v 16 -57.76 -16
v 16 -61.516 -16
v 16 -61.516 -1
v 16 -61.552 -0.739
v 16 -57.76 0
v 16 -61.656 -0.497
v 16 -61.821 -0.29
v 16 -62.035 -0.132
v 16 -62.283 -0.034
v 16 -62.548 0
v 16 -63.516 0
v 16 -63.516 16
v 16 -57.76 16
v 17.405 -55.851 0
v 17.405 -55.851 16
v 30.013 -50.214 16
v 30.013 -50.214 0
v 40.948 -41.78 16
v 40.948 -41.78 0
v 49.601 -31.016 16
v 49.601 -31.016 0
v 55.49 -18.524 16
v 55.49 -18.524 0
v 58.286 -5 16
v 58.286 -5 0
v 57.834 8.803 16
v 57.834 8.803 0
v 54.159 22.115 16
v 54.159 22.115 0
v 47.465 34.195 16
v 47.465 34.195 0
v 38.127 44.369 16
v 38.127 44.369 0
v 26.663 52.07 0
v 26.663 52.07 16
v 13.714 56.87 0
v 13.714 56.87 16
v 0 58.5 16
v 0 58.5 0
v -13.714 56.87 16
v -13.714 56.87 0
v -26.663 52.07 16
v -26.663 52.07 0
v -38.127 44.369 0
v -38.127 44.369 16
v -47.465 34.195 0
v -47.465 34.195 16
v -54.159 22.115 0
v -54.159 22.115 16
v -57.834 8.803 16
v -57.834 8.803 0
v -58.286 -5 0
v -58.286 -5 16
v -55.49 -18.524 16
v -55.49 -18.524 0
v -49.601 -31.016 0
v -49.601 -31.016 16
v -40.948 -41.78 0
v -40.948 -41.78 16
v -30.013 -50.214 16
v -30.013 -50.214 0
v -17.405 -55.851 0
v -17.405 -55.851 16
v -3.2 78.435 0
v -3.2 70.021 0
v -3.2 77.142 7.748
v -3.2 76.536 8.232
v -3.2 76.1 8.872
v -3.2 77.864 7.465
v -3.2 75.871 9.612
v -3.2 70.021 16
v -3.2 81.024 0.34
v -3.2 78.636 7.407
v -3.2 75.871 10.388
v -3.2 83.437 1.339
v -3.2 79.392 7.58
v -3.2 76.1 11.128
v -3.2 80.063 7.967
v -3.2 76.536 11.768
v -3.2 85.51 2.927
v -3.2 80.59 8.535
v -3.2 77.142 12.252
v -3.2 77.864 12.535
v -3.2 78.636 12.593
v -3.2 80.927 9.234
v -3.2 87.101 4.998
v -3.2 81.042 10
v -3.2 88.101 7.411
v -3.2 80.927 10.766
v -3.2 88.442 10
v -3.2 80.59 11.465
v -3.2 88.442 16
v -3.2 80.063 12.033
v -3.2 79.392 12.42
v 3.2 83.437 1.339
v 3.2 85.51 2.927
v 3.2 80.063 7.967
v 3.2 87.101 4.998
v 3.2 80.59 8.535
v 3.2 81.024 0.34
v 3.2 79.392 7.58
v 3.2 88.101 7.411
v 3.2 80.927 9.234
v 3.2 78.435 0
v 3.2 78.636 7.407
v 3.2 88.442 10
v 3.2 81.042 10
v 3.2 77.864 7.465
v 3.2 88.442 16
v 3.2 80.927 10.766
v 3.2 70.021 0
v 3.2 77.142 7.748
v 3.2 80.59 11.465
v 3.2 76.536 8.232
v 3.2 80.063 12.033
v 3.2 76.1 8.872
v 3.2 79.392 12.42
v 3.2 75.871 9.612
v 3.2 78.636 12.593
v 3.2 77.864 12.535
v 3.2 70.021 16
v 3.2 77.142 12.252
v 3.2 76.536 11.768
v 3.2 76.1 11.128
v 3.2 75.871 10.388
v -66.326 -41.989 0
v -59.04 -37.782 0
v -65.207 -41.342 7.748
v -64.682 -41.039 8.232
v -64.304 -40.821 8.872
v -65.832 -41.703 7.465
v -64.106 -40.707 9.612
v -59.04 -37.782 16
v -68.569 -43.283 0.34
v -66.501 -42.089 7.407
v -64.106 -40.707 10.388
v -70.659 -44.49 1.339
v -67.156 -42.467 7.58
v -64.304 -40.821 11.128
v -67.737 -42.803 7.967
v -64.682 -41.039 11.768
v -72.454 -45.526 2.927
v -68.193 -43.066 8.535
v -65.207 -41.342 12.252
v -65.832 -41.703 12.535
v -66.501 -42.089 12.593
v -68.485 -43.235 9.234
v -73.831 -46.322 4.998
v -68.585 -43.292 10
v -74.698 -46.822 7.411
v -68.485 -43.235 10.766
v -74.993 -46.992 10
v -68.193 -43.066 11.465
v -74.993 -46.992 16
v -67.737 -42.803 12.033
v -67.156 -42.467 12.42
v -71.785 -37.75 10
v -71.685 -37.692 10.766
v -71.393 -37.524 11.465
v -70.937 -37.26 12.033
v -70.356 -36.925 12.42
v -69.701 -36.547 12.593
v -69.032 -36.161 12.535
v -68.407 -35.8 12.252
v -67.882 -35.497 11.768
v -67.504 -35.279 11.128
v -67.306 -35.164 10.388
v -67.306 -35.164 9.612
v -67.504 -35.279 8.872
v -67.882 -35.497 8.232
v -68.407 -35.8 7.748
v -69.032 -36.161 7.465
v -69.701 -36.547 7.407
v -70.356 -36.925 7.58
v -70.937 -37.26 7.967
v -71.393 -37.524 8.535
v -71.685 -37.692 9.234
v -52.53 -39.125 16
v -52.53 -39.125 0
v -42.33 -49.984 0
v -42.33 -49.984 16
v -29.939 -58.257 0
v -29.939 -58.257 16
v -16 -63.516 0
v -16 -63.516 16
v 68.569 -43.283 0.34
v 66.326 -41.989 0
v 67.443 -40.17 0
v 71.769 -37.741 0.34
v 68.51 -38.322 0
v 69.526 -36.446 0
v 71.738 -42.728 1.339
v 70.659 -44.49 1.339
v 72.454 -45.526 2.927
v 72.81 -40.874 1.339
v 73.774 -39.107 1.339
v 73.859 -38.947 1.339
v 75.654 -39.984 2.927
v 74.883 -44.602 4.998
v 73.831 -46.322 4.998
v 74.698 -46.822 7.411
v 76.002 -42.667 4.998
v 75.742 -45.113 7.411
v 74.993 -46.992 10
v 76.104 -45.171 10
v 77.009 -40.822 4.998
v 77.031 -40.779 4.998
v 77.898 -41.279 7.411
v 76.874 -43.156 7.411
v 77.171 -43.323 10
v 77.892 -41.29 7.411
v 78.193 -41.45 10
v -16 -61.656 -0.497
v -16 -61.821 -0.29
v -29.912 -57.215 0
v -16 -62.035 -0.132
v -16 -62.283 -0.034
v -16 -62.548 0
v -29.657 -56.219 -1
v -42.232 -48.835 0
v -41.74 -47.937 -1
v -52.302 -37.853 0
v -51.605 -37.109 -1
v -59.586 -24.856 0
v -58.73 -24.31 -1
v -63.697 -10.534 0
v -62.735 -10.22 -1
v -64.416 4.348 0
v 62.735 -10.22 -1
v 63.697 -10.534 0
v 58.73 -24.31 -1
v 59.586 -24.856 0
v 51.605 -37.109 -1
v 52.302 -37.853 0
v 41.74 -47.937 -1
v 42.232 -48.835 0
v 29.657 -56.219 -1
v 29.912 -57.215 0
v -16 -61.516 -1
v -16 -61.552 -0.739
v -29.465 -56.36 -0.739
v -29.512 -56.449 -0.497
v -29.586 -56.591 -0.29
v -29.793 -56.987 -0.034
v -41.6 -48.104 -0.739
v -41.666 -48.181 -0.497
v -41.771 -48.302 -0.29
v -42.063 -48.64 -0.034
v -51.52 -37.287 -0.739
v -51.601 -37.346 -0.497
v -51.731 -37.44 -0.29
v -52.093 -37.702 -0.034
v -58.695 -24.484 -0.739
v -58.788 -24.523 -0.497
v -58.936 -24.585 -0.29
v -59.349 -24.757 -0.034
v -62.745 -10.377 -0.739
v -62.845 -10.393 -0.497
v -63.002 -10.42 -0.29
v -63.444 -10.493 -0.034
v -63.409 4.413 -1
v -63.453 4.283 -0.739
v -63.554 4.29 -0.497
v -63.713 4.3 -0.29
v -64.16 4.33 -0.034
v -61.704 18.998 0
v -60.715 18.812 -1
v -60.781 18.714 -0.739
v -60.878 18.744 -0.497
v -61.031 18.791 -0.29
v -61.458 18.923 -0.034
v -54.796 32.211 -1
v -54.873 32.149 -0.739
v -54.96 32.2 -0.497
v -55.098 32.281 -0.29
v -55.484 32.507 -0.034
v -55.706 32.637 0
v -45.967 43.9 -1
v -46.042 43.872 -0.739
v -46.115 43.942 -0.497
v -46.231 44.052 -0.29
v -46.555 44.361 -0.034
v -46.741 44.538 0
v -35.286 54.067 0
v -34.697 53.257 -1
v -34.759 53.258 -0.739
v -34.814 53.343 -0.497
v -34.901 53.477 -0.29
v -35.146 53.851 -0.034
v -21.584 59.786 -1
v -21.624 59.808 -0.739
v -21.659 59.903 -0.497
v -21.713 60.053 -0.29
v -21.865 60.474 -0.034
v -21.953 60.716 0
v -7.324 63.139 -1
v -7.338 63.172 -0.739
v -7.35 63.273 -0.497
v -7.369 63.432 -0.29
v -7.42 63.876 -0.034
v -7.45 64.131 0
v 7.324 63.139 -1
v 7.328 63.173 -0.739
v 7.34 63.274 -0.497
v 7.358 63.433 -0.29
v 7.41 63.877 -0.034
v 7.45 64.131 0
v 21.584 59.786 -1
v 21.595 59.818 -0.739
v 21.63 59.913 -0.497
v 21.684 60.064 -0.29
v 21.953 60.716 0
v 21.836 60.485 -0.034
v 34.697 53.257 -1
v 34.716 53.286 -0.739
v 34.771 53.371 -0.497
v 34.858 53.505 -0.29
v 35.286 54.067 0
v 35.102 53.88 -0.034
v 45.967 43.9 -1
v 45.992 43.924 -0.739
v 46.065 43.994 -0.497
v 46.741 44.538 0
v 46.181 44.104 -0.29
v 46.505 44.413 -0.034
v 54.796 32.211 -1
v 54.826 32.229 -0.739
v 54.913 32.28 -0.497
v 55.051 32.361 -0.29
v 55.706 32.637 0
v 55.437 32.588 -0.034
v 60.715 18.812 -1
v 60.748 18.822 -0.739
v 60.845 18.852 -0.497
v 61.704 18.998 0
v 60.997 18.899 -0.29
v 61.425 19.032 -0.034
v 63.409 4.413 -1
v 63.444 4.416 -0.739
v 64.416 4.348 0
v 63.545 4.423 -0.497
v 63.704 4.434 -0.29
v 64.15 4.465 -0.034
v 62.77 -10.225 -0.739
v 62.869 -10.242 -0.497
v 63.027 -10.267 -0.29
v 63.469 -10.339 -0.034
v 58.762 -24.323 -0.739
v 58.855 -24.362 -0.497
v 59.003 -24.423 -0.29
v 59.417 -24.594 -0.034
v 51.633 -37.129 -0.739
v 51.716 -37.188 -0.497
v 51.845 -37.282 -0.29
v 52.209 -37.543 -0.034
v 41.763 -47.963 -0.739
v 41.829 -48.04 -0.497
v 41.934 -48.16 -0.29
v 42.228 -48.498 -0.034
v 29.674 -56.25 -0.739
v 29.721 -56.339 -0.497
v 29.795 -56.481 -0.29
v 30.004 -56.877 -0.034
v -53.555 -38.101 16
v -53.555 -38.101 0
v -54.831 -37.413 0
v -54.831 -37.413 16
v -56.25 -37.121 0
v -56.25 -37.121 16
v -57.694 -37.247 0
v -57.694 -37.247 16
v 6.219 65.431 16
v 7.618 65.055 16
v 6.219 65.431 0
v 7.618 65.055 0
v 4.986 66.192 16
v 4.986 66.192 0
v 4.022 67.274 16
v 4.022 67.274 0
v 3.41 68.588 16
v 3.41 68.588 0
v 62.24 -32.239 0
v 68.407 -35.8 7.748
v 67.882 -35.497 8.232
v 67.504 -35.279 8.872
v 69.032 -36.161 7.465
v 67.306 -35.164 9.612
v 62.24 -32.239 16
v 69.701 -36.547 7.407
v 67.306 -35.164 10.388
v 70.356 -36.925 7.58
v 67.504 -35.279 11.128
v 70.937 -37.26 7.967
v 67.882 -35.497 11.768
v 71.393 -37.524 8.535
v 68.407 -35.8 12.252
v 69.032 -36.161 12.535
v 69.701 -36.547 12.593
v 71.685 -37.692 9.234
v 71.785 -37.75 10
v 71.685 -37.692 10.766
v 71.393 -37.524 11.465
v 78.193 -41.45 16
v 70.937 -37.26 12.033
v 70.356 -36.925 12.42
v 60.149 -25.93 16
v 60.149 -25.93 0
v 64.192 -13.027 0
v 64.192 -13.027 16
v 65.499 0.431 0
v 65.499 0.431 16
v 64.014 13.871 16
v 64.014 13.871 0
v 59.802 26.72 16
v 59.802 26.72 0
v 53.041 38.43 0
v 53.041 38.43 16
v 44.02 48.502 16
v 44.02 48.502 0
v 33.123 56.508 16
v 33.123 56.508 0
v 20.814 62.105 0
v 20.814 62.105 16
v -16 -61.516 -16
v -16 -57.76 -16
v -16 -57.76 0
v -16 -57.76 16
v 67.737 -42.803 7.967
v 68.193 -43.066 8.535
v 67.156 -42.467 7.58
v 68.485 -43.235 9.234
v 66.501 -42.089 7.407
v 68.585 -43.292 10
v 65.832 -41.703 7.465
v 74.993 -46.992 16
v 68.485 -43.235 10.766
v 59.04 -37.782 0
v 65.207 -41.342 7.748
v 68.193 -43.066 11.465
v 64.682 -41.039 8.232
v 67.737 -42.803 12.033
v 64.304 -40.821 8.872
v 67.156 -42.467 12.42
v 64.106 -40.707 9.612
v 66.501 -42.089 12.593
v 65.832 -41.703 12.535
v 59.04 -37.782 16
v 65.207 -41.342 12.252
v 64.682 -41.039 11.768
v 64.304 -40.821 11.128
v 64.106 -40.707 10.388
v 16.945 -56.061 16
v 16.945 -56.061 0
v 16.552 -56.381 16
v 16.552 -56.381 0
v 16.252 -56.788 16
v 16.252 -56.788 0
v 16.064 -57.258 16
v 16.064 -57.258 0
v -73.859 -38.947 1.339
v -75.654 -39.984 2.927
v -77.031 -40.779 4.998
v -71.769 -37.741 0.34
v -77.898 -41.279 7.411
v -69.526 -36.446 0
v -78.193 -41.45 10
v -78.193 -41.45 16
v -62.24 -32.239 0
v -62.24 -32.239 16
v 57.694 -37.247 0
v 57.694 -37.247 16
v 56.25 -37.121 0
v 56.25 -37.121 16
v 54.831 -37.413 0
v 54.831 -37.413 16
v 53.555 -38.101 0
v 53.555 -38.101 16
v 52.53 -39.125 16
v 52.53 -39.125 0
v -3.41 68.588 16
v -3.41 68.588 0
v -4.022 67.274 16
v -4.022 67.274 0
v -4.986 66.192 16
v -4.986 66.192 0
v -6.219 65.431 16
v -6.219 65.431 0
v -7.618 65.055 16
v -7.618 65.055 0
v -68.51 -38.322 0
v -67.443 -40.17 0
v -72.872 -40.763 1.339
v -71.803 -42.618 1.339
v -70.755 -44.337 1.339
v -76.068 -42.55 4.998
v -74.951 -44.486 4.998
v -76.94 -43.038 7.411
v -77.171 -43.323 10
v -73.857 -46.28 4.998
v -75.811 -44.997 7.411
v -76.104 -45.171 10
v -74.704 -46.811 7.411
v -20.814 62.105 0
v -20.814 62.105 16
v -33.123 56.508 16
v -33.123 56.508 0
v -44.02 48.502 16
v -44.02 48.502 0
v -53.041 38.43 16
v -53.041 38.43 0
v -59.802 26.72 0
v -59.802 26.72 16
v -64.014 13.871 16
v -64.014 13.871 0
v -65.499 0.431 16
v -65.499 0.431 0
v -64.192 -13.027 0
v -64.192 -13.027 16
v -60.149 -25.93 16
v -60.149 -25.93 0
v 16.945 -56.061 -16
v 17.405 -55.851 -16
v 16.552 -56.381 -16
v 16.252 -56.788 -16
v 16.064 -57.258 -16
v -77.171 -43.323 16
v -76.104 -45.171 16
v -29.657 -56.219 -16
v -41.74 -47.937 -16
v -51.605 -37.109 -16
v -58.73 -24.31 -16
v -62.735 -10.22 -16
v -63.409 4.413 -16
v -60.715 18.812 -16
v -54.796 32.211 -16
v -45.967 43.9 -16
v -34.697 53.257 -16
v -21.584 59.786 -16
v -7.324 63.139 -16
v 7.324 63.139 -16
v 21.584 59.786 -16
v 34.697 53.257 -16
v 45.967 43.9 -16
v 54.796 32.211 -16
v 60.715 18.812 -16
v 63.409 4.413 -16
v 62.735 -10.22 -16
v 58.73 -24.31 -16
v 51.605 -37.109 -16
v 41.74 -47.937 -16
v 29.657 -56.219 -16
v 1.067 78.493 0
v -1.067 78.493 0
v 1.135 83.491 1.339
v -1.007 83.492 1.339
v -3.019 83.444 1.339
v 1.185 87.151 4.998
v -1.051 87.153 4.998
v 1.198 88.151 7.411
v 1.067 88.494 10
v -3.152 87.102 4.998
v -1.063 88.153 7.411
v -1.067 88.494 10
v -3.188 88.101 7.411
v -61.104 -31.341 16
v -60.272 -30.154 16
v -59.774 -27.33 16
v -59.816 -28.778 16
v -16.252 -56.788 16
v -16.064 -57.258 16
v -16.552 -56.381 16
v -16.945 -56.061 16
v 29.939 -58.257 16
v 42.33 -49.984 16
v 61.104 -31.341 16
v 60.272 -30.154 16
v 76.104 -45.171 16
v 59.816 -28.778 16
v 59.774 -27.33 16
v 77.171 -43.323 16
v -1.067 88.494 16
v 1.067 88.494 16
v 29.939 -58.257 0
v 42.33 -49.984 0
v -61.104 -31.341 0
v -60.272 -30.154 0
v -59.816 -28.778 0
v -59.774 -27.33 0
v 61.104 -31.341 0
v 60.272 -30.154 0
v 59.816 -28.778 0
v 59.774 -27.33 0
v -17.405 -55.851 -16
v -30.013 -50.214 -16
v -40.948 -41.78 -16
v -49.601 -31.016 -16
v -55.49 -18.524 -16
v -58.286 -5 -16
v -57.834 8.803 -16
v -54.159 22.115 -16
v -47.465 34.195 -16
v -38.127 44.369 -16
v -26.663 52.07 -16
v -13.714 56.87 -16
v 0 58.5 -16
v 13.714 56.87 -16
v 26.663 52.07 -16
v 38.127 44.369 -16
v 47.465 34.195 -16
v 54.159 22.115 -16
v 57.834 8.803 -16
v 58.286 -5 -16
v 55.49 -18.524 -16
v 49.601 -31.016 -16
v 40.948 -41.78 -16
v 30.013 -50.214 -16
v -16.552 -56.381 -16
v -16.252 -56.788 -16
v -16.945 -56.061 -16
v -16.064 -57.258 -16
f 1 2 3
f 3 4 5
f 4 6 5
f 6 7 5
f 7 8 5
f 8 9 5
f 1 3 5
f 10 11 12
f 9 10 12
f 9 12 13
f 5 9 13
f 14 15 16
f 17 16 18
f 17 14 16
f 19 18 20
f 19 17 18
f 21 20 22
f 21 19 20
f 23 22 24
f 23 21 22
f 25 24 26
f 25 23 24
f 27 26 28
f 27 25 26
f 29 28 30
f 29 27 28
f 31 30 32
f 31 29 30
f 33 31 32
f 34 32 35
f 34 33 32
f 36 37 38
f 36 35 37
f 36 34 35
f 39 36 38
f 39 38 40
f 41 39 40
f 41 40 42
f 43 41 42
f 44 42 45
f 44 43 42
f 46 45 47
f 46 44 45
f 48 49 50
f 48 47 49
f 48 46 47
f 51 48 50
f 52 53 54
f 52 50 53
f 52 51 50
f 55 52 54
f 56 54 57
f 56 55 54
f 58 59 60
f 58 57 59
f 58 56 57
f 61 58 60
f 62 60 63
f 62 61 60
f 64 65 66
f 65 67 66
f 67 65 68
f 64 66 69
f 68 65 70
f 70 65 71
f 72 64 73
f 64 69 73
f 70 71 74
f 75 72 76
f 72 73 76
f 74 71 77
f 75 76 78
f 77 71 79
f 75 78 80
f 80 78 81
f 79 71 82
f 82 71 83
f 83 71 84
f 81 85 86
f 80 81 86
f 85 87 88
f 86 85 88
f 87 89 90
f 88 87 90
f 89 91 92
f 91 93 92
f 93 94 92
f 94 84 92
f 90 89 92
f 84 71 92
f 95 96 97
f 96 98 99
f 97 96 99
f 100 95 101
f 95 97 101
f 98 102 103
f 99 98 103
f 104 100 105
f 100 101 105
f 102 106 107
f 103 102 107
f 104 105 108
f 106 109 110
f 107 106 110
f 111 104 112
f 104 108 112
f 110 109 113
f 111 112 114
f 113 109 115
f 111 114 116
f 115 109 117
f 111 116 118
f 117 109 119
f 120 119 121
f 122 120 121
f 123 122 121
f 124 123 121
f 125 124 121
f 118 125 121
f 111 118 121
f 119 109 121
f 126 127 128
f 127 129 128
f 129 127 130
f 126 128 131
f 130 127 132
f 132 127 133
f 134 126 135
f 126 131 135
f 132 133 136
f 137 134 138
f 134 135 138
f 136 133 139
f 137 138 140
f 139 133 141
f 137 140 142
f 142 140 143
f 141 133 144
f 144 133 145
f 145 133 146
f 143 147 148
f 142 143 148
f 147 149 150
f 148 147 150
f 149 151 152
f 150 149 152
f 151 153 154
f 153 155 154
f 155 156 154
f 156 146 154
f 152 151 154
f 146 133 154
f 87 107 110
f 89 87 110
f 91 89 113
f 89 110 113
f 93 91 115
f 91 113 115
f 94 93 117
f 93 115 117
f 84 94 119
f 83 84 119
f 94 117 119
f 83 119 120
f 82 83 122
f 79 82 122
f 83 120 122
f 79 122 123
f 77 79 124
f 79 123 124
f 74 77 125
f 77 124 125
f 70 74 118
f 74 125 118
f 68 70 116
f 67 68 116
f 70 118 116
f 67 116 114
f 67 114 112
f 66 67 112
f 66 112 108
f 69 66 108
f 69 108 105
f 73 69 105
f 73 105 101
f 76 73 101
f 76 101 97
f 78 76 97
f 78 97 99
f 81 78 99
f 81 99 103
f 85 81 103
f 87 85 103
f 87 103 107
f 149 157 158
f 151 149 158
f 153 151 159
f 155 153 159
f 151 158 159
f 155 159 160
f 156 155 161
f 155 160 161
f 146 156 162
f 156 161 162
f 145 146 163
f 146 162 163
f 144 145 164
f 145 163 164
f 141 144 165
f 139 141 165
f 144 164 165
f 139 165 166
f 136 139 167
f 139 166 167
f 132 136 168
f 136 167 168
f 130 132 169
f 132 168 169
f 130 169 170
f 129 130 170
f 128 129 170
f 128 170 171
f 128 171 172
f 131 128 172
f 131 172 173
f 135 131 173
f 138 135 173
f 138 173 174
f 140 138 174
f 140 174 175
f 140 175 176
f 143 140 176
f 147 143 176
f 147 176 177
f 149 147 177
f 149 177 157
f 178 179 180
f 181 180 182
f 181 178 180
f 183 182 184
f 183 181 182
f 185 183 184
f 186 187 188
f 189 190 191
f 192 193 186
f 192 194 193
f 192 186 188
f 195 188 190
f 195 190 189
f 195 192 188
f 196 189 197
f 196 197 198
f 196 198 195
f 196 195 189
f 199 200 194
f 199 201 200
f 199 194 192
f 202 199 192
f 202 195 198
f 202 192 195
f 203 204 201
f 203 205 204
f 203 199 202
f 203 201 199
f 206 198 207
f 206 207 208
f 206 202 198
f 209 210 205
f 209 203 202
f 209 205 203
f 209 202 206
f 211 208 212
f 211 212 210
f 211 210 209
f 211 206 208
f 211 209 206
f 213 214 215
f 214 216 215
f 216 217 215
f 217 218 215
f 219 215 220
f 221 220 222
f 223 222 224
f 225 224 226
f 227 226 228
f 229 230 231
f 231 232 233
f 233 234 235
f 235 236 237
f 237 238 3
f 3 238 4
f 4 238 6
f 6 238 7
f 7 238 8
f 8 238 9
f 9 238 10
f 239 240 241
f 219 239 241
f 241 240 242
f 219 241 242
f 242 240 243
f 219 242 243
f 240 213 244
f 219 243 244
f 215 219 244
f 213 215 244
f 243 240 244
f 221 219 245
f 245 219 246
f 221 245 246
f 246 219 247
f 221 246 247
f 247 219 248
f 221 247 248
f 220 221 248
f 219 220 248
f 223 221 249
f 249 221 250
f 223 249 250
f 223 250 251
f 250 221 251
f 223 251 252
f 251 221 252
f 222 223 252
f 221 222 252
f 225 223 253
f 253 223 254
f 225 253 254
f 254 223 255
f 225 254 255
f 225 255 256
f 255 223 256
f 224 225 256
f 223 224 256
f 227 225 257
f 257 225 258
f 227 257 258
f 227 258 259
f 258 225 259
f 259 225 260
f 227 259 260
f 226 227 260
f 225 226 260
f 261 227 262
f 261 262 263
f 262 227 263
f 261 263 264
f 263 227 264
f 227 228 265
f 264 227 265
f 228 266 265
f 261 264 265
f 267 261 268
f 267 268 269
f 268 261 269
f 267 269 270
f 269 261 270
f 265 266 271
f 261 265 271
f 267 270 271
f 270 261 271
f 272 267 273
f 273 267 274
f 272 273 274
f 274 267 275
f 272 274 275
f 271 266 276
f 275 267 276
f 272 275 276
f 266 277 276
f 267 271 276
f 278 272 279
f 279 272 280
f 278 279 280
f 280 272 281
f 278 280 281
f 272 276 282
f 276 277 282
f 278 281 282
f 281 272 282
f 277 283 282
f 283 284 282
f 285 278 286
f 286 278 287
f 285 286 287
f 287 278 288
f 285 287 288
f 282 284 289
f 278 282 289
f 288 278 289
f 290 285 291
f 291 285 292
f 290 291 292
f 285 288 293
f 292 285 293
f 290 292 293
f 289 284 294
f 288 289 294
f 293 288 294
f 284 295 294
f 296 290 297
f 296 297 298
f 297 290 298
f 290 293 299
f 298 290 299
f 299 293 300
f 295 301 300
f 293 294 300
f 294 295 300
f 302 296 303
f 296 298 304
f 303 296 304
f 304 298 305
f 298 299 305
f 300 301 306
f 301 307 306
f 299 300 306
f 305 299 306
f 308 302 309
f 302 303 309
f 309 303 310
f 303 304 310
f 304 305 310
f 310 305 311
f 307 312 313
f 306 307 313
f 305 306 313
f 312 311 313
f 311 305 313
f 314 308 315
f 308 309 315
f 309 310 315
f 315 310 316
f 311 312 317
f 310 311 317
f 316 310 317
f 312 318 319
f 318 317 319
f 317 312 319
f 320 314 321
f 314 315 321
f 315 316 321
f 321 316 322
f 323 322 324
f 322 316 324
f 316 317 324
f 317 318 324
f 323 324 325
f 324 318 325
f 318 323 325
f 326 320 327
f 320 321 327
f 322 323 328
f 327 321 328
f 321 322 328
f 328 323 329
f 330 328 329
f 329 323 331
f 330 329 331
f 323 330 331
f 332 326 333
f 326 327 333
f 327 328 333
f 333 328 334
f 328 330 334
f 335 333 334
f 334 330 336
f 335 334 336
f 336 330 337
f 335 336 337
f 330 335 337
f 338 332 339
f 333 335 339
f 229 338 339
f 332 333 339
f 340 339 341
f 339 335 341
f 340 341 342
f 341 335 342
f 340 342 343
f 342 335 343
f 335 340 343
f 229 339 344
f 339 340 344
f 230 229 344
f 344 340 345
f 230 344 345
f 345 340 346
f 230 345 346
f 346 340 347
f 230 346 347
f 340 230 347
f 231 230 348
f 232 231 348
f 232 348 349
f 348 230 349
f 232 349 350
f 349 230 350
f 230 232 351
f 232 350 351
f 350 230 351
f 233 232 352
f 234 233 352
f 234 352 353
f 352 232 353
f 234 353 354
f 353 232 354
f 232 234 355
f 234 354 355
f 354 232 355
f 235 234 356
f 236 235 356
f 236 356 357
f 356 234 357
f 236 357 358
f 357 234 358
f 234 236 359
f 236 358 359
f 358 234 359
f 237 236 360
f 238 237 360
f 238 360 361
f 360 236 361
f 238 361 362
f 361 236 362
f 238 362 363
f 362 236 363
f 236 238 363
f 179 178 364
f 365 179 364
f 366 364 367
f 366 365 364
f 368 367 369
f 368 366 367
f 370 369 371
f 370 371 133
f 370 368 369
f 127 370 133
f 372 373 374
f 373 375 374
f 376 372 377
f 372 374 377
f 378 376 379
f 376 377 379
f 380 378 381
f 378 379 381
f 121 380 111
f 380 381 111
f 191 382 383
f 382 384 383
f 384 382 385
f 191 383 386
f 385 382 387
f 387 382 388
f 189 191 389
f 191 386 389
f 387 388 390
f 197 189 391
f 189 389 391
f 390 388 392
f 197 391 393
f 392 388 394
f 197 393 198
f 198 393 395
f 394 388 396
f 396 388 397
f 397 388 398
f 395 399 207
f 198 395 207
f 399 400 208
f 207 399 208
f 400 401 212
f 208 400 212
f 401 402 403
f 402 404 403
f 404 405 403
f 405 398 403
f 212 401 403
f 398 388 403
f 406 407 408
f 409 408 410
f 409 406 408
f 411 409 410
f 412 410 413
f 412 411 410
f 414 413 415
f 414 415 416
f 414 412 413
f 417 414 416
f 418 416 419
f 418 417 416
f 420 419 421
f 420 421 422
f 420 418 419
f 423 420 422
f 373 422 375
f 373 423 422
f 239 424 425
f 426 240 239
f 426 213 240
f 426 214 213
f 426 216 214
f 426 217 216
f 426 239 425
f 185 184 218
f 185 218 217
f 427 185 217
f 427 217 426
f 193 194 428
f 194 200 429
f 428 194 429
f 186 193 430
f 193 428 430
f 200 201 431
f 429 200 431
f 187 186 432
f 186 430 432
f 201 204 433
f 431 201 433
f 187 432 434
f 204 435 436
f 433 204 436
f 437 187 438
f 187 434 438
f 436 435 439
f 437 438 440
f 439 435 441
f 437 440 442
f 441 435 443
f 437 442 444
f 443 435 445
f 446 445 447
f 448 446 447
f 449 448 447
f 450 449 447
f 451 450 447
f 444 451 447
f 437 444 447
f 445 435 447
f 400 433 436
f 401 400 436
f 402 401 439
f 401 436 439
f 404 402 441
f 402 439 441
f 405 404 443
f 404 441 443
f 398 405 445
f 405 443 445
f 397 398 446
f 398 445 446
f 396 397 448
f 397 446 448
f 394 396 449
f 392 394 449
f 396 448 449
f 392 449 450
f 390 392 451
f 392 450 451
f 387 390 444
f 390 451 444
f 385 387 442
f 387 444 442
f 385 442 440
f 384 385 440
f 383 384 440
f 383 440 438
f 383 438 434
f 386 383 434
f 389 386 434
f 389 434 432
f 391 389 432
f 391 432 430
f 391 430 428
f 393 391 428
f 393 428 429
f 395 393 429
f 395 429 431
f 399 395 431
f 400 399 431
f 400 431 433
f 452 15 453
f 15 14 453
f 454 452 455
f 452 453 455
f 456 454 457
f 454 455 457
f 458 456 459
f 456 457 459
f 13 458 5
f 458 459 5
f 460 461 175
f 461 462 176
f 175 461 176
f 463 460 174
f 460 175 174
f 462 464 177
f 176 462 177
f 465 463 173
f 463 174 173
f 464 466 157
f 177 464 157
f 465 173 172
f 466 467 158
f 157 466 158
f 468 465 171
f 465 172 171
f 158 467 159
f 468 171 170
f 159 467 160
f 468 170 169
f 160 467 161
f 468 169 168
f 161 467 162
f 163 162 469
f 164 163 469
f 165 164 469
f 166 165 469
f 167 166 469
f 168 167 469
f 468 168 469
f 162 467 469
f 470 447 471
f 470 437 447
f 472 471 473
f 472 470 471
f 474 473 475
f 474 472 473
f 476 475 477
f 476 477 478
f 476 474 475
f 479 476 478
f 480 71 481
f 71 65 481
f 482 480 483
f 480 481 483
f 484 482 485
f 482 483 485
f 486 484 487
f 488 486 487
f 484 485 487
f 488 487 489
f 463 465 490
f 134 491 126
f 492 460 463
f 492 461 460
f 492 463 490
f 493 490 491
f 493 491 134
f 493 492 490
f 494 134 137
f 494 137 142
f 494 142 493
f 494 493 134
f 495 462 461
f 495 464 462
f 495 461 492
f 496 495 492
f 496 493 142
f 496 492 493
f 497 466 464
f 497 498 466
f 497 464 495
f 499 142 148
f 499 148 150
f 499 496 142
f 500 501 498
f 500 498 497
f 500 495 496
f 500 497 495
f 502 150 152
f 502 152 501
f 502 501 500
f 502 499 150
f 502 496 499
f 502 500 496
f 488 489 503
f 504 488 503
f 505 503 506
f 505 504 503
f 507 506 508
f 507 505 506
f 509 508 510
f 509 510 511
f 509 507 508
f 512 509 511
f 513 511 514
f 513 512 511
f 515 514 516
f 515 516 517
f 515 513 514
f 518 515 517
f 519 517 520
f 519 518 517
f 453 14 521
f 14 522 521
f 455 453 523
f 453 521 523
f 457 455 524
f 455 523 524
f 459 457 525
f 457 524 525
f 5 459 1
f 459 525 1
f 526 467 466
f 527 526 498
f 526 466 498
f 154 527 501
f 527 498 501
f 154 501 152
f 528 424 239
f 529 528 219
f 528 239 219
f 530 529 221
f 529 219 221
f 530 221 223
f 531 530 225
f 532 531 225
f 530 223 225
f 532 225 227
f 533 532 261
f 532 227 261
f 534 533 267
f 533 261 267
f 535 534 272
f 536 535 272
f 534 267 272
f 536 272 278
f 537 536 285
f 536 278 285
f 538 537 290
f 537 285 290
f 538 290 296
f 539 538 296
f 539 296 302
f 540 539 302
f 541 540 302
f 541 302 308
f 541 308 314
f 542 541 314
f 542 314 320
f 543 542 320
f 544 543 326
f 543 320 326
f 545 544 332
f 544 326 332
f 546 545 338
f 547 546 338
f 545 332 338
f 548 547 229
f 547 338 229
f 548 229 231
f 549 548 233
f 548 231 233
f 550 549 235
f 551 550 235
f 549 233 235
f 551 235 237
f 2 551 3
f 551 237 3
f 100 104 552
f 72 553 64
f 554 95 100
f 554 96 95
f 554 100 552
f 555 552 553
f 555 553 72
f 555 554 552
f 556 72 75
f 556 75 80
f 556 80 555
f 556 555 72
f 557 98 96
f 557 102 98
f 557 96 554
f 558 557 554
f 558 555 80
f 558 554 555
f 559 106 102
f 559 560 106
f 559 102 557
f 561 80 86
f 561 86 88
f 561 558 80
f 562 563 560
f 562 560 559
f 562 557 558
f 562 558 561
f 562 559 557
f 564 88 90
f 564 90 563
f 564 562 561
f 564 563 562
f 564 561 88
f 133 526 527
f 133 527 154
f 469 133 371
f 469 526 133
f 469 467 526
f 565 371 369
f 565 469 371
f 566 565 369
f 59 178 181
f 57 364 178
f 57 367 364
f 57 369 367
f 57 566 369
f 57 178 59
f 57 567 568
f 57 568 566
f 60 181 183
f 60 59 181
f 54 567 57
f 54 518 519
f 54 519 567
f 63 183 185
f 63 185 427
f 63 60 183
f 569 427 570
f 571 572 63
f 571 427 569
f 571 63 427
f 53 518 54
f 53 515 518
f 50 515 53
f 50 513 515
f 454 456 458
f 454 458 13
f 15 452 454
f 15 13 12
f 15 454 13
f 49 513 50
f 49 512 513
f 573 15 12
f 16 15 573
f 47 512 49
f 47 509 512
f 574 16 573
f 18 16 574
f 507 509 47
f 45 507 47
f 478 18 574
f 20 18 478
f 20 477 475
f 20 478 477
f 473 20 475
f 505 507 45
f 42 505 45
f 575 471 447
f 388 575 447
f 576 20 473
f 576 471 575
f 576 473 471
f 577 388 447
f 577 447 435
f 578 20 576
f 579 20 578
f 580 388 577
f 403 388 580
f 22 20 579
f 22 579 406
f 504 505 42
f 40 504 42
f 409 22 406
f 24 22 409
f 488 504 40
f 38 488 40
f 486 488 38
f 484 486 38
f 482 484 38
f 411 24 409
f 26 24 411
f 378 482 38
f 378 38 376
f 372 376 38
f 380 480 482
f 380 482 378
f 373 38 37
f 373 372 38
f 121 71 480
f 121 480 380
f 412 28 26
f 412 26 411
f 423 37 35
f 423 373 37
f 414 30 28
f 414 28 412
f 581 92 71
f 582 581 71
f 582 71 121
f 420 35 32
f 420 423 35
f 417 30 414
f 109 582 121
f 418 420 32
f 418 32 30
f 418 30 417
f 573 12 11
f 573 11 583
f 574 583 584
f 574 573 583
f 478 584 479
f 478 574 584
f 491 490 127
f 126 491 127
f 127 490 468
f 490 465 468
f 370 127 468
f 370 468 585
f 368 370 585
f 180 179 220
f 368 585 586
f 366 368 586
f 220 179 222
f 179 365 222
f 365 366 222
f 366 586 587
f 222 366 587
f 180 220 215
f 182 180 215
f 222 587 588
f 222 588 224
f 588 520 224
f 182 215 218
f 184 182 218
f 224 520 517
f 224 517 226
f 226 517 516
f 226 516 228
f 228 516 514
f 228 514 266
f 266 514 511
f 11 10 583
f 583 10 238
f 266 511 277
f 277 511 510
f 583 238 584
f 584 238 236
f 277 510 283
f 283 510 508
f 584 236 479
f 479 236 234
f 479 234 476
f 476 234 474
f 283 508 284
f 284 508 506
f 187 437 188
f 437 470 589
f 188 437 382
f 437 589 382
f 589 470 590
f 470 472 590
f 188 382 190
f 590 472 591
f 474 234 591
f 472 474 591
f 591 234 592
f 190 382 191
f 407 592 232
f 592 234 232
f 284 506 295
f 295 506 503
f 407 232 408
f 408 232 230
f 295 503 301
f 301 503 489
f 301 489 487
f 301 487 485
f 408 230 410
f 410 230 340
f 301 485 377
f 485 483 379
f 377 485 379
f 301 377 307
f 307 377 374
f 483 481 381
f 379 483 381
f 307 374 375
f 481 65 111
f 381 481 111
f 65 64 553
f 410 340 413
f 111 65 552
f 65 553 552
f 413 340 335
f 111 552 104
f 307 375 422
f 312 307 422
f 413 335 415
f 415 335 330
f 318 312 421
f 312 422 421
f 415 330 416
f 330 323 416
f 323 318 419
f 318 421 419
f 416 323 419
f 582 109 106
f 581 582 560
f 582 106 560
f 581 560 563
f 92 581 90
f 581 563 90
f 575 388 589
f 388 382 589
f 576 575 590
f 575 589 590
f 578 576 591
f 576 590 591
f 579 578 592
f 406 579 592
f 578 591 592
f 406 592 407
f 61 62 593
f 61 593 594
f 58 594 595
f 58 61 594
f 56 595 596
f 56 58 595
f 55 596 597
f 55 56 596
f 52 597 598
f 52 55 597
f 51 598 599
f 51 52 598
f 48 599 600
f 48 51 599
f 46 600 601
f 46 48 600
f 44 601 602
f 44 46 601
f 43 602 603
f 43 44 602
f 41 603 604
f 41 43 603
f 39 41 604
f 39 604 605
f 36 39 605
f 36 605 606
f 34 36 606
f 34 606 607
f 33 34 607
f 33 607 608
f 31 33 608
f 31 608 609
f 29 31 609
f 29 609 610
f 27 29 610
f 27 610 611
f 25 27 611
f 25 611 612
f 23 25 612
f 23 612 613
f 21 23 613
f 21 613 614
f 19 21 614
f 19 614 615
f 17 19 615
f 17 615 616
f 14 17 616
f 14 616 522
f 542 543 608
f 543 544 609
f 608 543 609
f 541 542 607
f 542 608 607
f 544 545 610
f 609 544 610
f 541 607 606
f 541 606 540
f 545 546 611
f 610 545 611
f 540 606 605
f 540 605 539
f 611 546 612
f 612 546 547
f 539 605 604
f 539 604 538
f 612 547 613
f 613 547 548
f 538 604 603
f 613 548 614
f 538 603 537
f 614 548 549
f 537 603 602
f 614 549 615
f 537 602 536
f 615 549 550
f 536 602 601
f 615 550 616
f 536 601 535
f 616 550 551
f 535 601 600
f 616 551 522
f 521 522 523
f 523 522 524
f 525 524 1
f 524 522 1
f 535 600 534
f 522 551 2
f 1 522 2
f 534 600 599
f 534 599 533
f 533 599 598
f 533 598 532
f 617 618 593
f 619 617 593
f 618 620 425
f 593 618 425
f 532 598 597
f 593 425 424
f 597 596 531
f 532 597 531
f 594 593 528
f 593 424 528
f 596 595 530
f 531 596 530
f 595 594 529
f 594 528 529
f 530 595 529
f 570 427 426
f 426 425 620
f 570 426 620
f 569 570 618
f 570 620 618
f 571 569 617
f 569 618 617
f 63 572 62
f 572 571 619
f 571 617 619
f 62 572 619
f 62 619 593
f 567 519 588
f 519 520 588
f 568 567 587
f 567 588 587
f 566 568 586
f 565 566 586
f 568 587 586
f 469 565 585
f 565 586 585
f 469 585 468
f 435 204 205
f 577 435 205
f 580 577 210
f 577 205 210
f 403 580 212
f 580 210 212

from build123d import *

# Parameters (mm, degrees)
SKETCH_R              = 88.5
SKETCH_R_2            = 58.5
PAD_DEPTH             = 16
POCKET_DEPTH          = 517.654267
POLARPATTERN_COUNT    = 3
SKETCH002_W           = 32
SKETCH002_H           = 137
POCKET001_DEPTH       = 16.001
SKETCH003_R           = 2.6
POCKET002_DEPTH       = 518.756447
POLARPATTERN001_COUNT = 3
PAD001_DEPTH          = 16
FILLET_R              = 1
FILLET001_R           = 2
FILLET002_R           = 10
FILLET003_R           = 5


with BuildPart() as part:
    # Sketch → Pad (new body)
    with BuildSketch(Plane.XY):
        Circle(SKETCH_R)
        Circle(SKETCH_R_2, mode=Mode.SUBTRACT)
    extrude(amount=PAD_DEPTH)

    # Sketch001 (on Face4 of Pad) → Pocket (cut, through all)
    with BuildSketch(Plane.XY.offset(16)):
        with BuildLine():
            ThreePointArc((58.256928, -29.939611), (56.724664, 32.75), (3.2, 65.421785))
            Line((3.2, 192.421785), (3.2, 65.421785))
            ThreePointArc((168.242154, -93.439611), (166.665196, 96.224196), (3.2, 192.421785))
            Line((58.256928, -29.939611), (168.242154, -93.439611))
        make_face()
    pocket = extrude(amount=-POCKET_DEPTH, mode=Mode.SUBTRACT)

    # PolarPattern: Pocket ×3 about axis
    polarpattern_axis = Axis((0, 0, 16), (0, 0, 1))
    for i in range(1, POLARPATTERN_COUNT):
        add(pocket.rotate(polarpattern_axis, i * 360 / POLARPATTERN_COUNT), mode=Mode.SUBTRACT)

    # Sketch002 (on Face4 of PolarPattern) → Pocket001 (cut, through all)
    with BuildSketch(Plane.XY.offset(16)):
        with Locations((0, -68.5)):
            Rectangle(SKETCH002_W, SKETCH002_H)
    extrude(amount=-POCKET001_DEPTH, mode=Mode.SUBTRACT)

    # Sketch003 (on Face5 of Pocket001) → Pocket002 (cut, through all)
    with BuildSketch(Plane.YZ.offset(3.2)):
        with Locations((78.442128, 10)):
            Circle(SKETCH003_R)
    pocket002 = extrude(amount=-POCKET002_DEPTH, mode=Mode.SUBTRACT)

    # PolarPattern001: Pocket002 ×3 about axis
    polarpattern001_axis = Axis((0, 0, 0), (0, 0, 1))
    for i in range(1, POLARPATTERN001_COUNT):
        add(pocket002.rotate(polarpattern001_axis, i * 360 / POLARPATTERN001_COUNT), mode=Mode.SUBTRACT)

    # Sketch004 (on Face2 of PolarPattern001) → Pad001 (join)
    with BuildSketch(Plane(origin=(0, 0, 0), x_dir=(1, 0, 0), z_dir=(0, 0, -1))):
        with BuildLine():
            ThreePointArc((-16, 56.269441), (0, -58.5), (16, 56.269441))
            Line((16, 61.515746), (16, 56.269441))
            ThreePointArc((-16, 61.515746), (0, -63.562465), (16, 61.515746))
            Line((-16, 61.515746), (-16, 56.269441))
        make_face()
    extrude(amount=PAD001_DEPTH)

    # Fillet
    fillet_edges = [part.edges().sort_by_distance(p)[0] for p in [
        (0, 63.562465, 0),
    ]]
    fillet(fillet_edges, radius=FILLET_R)

    # Fillet001
    fillet001_edges = [part.edges().sort_by_distance(p)[0] for p in [
        (-16, -56.269441, -8),
        (-16, -56.269441, 8),
        (16, -56.269441, -8),
        (16, -56.269441, 8),
    ]]
    fillet(fillet001_edges, radius=FILLET001_R)

    # Fillet002
    fillet002_edges = [part.edges().sort_by_distance(p)[0] for p in [
        (-76.643248, -44.25, 0),
        (76.643248, -44.25, 0),
        (0, 88.5, 0),
    ]]
    fillet(fillet002_edges, radius=FILLET002_R)

    # Fillet003
    fillet003_edges = [part.edges().sort_by_distance(p)[0] for p in [
        (58.256928, -29.939611, 8),
        (55.056928, -35.482174, 8),
        (-55.056928, -35.482174, 8),
        (-58.256928, -29.939611, 8),
        (-3.2, 65.421785, 8),
        (3.2, 65.421785, 8),
    ]]
    fillet(fillet003_edges, radius=FILLET003_R)


solid = part.part
